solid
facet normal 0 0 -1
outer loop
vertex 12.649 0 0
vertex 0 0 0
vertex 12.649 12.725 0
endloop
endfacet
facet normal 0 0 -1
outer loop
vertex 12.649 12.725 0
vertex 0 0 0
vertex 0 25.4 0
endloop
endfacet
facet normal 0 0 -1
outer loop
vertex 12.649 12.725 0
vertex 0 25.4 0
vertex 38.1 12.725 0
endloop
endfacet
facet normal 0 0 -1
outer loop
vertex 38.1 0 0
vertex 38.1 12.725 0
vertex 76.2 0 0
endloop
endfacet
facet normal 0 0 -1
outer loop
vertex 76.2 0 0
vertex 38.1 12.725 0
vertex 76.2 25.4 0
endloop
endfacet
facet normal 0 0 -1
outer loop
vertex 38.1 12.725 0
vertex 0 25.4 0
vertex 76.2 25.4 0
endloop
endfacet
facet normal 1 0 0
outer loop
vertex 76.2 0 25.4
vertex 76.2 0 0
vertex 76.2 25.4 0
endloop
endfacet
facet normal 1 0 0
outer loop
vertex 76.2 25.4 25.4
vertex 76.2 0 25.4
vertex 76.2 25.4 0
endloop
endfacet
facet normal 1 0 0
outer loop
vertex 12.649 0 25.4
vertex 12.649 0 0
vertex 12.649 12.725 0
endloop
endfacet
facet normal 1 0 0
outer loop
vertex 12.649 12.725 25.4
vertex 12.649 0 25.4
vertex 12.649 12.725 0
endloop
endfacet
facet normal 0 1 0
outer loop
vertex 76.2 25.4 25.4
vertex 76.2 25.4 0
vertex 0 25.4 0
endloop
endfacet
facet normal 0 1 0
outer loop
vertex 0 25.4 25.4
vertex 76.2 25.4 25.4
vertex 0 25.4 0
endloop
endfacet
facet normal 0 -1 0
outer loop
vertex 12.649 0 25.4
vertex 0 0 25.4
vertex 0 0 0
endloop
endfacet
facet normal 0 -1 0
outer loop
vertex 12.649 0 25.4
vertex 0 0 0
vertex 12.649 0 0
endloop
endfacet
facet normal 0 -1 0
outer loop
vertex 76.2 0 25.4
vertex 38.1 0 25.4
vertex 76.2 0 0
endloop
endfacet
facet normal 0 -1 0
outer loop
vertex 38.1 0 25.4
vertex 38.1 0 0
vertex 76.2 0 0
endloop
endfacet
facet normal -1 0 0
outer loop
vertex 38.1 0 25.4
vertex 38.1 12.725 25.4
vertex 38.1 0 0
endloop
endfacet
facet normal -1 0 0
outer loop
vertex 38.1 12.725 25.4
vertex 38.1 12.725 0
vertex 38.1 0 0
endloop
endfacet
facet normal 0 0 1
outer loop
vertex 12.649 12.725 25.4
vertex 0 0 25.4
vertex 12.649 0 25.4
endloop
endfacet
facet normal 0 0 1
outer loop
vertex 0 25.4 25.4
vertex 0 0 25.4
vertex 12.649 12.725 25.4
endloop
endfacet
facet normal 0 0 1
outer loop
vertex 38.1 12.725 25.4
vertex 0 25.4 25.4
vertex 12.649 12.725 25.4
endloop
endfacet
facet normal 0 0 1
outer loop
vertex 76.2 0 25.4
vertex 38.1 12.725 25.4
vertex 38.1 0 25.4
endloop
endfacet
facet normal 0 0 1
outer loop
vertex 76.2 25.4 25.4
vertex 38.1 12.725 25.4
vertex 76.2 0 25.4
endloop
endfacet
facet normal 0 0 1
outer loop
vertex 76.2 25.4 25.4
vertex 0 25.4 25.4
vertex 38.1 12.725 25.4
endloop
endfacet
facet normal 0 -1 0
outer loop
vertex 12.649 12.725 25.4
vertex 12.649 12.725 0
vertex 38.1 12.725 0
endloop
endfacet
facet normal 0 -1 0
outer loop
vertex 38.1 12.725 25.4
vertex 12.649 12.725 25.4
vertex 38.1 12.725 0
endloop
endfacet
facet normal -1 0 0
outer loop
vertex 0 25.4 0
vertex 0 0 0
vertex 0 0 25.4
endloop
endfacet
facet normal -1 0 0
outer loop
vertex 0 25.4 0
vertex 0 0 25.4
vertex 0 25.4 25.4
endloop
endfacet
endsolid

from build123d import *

# Parameters (mm, degrees)
F0_W     = 76.2
F0_H     = 25.4
F1_DEPTH = 25.4
F2_W     = 25.4508
F2_H     = 12.7254
F3_DEPTH = 25.4
F4_W     = 25.4508
F4_H     = 12.7254
F5_DEPTH = 25.654
F6_DEPTH = 12.304268


with BuildPart() as f1:
    # F0 (on Top) → F1 (new body)
    with BuildSketch(Plane.XY):
        with Locations((38.1, 12.7)):
            Rectangle(F0_W, F0_H)
    extrude(amount=F1_DEPTH)

    # F2 (on Front) → F3 (cut)
    with BuildSketch(Plane.XZ):
        with Locations((38.1, 19.458432)):
            Rectangle(F2_W, F2_H)
    extrude(amount=-F3_DEPTH, mode=Mode.SUBTRACT)

    # F4 (on Top) → F5 (cut)
    with BuildSketch(Plane.XY):
        with Locations((25.3746, 6.3627)):
            Rectangle(F4_W, F4_H)
    extrude(amount=F5_DEPTH, mode=Mode.SUBTRACT)

    # F3_face (on face) → F6 (join, through all)
    with BuildSketch(Plane(origin=(40.22656, 14.81807, 13.095732), x_dir=(1, 0, 0), z_dir=(0, 0, 1))):
        Polygon((-14.85196, -2.09267), (-2.12656, -2.09267), (-2.12656, -14.81807), (10.59884, -14.81807), (10.59884, 10.58193), (-14.85196, 10.58193), align=None)
    extrude(amount=F6_DEPTH)


solid = f1.part
